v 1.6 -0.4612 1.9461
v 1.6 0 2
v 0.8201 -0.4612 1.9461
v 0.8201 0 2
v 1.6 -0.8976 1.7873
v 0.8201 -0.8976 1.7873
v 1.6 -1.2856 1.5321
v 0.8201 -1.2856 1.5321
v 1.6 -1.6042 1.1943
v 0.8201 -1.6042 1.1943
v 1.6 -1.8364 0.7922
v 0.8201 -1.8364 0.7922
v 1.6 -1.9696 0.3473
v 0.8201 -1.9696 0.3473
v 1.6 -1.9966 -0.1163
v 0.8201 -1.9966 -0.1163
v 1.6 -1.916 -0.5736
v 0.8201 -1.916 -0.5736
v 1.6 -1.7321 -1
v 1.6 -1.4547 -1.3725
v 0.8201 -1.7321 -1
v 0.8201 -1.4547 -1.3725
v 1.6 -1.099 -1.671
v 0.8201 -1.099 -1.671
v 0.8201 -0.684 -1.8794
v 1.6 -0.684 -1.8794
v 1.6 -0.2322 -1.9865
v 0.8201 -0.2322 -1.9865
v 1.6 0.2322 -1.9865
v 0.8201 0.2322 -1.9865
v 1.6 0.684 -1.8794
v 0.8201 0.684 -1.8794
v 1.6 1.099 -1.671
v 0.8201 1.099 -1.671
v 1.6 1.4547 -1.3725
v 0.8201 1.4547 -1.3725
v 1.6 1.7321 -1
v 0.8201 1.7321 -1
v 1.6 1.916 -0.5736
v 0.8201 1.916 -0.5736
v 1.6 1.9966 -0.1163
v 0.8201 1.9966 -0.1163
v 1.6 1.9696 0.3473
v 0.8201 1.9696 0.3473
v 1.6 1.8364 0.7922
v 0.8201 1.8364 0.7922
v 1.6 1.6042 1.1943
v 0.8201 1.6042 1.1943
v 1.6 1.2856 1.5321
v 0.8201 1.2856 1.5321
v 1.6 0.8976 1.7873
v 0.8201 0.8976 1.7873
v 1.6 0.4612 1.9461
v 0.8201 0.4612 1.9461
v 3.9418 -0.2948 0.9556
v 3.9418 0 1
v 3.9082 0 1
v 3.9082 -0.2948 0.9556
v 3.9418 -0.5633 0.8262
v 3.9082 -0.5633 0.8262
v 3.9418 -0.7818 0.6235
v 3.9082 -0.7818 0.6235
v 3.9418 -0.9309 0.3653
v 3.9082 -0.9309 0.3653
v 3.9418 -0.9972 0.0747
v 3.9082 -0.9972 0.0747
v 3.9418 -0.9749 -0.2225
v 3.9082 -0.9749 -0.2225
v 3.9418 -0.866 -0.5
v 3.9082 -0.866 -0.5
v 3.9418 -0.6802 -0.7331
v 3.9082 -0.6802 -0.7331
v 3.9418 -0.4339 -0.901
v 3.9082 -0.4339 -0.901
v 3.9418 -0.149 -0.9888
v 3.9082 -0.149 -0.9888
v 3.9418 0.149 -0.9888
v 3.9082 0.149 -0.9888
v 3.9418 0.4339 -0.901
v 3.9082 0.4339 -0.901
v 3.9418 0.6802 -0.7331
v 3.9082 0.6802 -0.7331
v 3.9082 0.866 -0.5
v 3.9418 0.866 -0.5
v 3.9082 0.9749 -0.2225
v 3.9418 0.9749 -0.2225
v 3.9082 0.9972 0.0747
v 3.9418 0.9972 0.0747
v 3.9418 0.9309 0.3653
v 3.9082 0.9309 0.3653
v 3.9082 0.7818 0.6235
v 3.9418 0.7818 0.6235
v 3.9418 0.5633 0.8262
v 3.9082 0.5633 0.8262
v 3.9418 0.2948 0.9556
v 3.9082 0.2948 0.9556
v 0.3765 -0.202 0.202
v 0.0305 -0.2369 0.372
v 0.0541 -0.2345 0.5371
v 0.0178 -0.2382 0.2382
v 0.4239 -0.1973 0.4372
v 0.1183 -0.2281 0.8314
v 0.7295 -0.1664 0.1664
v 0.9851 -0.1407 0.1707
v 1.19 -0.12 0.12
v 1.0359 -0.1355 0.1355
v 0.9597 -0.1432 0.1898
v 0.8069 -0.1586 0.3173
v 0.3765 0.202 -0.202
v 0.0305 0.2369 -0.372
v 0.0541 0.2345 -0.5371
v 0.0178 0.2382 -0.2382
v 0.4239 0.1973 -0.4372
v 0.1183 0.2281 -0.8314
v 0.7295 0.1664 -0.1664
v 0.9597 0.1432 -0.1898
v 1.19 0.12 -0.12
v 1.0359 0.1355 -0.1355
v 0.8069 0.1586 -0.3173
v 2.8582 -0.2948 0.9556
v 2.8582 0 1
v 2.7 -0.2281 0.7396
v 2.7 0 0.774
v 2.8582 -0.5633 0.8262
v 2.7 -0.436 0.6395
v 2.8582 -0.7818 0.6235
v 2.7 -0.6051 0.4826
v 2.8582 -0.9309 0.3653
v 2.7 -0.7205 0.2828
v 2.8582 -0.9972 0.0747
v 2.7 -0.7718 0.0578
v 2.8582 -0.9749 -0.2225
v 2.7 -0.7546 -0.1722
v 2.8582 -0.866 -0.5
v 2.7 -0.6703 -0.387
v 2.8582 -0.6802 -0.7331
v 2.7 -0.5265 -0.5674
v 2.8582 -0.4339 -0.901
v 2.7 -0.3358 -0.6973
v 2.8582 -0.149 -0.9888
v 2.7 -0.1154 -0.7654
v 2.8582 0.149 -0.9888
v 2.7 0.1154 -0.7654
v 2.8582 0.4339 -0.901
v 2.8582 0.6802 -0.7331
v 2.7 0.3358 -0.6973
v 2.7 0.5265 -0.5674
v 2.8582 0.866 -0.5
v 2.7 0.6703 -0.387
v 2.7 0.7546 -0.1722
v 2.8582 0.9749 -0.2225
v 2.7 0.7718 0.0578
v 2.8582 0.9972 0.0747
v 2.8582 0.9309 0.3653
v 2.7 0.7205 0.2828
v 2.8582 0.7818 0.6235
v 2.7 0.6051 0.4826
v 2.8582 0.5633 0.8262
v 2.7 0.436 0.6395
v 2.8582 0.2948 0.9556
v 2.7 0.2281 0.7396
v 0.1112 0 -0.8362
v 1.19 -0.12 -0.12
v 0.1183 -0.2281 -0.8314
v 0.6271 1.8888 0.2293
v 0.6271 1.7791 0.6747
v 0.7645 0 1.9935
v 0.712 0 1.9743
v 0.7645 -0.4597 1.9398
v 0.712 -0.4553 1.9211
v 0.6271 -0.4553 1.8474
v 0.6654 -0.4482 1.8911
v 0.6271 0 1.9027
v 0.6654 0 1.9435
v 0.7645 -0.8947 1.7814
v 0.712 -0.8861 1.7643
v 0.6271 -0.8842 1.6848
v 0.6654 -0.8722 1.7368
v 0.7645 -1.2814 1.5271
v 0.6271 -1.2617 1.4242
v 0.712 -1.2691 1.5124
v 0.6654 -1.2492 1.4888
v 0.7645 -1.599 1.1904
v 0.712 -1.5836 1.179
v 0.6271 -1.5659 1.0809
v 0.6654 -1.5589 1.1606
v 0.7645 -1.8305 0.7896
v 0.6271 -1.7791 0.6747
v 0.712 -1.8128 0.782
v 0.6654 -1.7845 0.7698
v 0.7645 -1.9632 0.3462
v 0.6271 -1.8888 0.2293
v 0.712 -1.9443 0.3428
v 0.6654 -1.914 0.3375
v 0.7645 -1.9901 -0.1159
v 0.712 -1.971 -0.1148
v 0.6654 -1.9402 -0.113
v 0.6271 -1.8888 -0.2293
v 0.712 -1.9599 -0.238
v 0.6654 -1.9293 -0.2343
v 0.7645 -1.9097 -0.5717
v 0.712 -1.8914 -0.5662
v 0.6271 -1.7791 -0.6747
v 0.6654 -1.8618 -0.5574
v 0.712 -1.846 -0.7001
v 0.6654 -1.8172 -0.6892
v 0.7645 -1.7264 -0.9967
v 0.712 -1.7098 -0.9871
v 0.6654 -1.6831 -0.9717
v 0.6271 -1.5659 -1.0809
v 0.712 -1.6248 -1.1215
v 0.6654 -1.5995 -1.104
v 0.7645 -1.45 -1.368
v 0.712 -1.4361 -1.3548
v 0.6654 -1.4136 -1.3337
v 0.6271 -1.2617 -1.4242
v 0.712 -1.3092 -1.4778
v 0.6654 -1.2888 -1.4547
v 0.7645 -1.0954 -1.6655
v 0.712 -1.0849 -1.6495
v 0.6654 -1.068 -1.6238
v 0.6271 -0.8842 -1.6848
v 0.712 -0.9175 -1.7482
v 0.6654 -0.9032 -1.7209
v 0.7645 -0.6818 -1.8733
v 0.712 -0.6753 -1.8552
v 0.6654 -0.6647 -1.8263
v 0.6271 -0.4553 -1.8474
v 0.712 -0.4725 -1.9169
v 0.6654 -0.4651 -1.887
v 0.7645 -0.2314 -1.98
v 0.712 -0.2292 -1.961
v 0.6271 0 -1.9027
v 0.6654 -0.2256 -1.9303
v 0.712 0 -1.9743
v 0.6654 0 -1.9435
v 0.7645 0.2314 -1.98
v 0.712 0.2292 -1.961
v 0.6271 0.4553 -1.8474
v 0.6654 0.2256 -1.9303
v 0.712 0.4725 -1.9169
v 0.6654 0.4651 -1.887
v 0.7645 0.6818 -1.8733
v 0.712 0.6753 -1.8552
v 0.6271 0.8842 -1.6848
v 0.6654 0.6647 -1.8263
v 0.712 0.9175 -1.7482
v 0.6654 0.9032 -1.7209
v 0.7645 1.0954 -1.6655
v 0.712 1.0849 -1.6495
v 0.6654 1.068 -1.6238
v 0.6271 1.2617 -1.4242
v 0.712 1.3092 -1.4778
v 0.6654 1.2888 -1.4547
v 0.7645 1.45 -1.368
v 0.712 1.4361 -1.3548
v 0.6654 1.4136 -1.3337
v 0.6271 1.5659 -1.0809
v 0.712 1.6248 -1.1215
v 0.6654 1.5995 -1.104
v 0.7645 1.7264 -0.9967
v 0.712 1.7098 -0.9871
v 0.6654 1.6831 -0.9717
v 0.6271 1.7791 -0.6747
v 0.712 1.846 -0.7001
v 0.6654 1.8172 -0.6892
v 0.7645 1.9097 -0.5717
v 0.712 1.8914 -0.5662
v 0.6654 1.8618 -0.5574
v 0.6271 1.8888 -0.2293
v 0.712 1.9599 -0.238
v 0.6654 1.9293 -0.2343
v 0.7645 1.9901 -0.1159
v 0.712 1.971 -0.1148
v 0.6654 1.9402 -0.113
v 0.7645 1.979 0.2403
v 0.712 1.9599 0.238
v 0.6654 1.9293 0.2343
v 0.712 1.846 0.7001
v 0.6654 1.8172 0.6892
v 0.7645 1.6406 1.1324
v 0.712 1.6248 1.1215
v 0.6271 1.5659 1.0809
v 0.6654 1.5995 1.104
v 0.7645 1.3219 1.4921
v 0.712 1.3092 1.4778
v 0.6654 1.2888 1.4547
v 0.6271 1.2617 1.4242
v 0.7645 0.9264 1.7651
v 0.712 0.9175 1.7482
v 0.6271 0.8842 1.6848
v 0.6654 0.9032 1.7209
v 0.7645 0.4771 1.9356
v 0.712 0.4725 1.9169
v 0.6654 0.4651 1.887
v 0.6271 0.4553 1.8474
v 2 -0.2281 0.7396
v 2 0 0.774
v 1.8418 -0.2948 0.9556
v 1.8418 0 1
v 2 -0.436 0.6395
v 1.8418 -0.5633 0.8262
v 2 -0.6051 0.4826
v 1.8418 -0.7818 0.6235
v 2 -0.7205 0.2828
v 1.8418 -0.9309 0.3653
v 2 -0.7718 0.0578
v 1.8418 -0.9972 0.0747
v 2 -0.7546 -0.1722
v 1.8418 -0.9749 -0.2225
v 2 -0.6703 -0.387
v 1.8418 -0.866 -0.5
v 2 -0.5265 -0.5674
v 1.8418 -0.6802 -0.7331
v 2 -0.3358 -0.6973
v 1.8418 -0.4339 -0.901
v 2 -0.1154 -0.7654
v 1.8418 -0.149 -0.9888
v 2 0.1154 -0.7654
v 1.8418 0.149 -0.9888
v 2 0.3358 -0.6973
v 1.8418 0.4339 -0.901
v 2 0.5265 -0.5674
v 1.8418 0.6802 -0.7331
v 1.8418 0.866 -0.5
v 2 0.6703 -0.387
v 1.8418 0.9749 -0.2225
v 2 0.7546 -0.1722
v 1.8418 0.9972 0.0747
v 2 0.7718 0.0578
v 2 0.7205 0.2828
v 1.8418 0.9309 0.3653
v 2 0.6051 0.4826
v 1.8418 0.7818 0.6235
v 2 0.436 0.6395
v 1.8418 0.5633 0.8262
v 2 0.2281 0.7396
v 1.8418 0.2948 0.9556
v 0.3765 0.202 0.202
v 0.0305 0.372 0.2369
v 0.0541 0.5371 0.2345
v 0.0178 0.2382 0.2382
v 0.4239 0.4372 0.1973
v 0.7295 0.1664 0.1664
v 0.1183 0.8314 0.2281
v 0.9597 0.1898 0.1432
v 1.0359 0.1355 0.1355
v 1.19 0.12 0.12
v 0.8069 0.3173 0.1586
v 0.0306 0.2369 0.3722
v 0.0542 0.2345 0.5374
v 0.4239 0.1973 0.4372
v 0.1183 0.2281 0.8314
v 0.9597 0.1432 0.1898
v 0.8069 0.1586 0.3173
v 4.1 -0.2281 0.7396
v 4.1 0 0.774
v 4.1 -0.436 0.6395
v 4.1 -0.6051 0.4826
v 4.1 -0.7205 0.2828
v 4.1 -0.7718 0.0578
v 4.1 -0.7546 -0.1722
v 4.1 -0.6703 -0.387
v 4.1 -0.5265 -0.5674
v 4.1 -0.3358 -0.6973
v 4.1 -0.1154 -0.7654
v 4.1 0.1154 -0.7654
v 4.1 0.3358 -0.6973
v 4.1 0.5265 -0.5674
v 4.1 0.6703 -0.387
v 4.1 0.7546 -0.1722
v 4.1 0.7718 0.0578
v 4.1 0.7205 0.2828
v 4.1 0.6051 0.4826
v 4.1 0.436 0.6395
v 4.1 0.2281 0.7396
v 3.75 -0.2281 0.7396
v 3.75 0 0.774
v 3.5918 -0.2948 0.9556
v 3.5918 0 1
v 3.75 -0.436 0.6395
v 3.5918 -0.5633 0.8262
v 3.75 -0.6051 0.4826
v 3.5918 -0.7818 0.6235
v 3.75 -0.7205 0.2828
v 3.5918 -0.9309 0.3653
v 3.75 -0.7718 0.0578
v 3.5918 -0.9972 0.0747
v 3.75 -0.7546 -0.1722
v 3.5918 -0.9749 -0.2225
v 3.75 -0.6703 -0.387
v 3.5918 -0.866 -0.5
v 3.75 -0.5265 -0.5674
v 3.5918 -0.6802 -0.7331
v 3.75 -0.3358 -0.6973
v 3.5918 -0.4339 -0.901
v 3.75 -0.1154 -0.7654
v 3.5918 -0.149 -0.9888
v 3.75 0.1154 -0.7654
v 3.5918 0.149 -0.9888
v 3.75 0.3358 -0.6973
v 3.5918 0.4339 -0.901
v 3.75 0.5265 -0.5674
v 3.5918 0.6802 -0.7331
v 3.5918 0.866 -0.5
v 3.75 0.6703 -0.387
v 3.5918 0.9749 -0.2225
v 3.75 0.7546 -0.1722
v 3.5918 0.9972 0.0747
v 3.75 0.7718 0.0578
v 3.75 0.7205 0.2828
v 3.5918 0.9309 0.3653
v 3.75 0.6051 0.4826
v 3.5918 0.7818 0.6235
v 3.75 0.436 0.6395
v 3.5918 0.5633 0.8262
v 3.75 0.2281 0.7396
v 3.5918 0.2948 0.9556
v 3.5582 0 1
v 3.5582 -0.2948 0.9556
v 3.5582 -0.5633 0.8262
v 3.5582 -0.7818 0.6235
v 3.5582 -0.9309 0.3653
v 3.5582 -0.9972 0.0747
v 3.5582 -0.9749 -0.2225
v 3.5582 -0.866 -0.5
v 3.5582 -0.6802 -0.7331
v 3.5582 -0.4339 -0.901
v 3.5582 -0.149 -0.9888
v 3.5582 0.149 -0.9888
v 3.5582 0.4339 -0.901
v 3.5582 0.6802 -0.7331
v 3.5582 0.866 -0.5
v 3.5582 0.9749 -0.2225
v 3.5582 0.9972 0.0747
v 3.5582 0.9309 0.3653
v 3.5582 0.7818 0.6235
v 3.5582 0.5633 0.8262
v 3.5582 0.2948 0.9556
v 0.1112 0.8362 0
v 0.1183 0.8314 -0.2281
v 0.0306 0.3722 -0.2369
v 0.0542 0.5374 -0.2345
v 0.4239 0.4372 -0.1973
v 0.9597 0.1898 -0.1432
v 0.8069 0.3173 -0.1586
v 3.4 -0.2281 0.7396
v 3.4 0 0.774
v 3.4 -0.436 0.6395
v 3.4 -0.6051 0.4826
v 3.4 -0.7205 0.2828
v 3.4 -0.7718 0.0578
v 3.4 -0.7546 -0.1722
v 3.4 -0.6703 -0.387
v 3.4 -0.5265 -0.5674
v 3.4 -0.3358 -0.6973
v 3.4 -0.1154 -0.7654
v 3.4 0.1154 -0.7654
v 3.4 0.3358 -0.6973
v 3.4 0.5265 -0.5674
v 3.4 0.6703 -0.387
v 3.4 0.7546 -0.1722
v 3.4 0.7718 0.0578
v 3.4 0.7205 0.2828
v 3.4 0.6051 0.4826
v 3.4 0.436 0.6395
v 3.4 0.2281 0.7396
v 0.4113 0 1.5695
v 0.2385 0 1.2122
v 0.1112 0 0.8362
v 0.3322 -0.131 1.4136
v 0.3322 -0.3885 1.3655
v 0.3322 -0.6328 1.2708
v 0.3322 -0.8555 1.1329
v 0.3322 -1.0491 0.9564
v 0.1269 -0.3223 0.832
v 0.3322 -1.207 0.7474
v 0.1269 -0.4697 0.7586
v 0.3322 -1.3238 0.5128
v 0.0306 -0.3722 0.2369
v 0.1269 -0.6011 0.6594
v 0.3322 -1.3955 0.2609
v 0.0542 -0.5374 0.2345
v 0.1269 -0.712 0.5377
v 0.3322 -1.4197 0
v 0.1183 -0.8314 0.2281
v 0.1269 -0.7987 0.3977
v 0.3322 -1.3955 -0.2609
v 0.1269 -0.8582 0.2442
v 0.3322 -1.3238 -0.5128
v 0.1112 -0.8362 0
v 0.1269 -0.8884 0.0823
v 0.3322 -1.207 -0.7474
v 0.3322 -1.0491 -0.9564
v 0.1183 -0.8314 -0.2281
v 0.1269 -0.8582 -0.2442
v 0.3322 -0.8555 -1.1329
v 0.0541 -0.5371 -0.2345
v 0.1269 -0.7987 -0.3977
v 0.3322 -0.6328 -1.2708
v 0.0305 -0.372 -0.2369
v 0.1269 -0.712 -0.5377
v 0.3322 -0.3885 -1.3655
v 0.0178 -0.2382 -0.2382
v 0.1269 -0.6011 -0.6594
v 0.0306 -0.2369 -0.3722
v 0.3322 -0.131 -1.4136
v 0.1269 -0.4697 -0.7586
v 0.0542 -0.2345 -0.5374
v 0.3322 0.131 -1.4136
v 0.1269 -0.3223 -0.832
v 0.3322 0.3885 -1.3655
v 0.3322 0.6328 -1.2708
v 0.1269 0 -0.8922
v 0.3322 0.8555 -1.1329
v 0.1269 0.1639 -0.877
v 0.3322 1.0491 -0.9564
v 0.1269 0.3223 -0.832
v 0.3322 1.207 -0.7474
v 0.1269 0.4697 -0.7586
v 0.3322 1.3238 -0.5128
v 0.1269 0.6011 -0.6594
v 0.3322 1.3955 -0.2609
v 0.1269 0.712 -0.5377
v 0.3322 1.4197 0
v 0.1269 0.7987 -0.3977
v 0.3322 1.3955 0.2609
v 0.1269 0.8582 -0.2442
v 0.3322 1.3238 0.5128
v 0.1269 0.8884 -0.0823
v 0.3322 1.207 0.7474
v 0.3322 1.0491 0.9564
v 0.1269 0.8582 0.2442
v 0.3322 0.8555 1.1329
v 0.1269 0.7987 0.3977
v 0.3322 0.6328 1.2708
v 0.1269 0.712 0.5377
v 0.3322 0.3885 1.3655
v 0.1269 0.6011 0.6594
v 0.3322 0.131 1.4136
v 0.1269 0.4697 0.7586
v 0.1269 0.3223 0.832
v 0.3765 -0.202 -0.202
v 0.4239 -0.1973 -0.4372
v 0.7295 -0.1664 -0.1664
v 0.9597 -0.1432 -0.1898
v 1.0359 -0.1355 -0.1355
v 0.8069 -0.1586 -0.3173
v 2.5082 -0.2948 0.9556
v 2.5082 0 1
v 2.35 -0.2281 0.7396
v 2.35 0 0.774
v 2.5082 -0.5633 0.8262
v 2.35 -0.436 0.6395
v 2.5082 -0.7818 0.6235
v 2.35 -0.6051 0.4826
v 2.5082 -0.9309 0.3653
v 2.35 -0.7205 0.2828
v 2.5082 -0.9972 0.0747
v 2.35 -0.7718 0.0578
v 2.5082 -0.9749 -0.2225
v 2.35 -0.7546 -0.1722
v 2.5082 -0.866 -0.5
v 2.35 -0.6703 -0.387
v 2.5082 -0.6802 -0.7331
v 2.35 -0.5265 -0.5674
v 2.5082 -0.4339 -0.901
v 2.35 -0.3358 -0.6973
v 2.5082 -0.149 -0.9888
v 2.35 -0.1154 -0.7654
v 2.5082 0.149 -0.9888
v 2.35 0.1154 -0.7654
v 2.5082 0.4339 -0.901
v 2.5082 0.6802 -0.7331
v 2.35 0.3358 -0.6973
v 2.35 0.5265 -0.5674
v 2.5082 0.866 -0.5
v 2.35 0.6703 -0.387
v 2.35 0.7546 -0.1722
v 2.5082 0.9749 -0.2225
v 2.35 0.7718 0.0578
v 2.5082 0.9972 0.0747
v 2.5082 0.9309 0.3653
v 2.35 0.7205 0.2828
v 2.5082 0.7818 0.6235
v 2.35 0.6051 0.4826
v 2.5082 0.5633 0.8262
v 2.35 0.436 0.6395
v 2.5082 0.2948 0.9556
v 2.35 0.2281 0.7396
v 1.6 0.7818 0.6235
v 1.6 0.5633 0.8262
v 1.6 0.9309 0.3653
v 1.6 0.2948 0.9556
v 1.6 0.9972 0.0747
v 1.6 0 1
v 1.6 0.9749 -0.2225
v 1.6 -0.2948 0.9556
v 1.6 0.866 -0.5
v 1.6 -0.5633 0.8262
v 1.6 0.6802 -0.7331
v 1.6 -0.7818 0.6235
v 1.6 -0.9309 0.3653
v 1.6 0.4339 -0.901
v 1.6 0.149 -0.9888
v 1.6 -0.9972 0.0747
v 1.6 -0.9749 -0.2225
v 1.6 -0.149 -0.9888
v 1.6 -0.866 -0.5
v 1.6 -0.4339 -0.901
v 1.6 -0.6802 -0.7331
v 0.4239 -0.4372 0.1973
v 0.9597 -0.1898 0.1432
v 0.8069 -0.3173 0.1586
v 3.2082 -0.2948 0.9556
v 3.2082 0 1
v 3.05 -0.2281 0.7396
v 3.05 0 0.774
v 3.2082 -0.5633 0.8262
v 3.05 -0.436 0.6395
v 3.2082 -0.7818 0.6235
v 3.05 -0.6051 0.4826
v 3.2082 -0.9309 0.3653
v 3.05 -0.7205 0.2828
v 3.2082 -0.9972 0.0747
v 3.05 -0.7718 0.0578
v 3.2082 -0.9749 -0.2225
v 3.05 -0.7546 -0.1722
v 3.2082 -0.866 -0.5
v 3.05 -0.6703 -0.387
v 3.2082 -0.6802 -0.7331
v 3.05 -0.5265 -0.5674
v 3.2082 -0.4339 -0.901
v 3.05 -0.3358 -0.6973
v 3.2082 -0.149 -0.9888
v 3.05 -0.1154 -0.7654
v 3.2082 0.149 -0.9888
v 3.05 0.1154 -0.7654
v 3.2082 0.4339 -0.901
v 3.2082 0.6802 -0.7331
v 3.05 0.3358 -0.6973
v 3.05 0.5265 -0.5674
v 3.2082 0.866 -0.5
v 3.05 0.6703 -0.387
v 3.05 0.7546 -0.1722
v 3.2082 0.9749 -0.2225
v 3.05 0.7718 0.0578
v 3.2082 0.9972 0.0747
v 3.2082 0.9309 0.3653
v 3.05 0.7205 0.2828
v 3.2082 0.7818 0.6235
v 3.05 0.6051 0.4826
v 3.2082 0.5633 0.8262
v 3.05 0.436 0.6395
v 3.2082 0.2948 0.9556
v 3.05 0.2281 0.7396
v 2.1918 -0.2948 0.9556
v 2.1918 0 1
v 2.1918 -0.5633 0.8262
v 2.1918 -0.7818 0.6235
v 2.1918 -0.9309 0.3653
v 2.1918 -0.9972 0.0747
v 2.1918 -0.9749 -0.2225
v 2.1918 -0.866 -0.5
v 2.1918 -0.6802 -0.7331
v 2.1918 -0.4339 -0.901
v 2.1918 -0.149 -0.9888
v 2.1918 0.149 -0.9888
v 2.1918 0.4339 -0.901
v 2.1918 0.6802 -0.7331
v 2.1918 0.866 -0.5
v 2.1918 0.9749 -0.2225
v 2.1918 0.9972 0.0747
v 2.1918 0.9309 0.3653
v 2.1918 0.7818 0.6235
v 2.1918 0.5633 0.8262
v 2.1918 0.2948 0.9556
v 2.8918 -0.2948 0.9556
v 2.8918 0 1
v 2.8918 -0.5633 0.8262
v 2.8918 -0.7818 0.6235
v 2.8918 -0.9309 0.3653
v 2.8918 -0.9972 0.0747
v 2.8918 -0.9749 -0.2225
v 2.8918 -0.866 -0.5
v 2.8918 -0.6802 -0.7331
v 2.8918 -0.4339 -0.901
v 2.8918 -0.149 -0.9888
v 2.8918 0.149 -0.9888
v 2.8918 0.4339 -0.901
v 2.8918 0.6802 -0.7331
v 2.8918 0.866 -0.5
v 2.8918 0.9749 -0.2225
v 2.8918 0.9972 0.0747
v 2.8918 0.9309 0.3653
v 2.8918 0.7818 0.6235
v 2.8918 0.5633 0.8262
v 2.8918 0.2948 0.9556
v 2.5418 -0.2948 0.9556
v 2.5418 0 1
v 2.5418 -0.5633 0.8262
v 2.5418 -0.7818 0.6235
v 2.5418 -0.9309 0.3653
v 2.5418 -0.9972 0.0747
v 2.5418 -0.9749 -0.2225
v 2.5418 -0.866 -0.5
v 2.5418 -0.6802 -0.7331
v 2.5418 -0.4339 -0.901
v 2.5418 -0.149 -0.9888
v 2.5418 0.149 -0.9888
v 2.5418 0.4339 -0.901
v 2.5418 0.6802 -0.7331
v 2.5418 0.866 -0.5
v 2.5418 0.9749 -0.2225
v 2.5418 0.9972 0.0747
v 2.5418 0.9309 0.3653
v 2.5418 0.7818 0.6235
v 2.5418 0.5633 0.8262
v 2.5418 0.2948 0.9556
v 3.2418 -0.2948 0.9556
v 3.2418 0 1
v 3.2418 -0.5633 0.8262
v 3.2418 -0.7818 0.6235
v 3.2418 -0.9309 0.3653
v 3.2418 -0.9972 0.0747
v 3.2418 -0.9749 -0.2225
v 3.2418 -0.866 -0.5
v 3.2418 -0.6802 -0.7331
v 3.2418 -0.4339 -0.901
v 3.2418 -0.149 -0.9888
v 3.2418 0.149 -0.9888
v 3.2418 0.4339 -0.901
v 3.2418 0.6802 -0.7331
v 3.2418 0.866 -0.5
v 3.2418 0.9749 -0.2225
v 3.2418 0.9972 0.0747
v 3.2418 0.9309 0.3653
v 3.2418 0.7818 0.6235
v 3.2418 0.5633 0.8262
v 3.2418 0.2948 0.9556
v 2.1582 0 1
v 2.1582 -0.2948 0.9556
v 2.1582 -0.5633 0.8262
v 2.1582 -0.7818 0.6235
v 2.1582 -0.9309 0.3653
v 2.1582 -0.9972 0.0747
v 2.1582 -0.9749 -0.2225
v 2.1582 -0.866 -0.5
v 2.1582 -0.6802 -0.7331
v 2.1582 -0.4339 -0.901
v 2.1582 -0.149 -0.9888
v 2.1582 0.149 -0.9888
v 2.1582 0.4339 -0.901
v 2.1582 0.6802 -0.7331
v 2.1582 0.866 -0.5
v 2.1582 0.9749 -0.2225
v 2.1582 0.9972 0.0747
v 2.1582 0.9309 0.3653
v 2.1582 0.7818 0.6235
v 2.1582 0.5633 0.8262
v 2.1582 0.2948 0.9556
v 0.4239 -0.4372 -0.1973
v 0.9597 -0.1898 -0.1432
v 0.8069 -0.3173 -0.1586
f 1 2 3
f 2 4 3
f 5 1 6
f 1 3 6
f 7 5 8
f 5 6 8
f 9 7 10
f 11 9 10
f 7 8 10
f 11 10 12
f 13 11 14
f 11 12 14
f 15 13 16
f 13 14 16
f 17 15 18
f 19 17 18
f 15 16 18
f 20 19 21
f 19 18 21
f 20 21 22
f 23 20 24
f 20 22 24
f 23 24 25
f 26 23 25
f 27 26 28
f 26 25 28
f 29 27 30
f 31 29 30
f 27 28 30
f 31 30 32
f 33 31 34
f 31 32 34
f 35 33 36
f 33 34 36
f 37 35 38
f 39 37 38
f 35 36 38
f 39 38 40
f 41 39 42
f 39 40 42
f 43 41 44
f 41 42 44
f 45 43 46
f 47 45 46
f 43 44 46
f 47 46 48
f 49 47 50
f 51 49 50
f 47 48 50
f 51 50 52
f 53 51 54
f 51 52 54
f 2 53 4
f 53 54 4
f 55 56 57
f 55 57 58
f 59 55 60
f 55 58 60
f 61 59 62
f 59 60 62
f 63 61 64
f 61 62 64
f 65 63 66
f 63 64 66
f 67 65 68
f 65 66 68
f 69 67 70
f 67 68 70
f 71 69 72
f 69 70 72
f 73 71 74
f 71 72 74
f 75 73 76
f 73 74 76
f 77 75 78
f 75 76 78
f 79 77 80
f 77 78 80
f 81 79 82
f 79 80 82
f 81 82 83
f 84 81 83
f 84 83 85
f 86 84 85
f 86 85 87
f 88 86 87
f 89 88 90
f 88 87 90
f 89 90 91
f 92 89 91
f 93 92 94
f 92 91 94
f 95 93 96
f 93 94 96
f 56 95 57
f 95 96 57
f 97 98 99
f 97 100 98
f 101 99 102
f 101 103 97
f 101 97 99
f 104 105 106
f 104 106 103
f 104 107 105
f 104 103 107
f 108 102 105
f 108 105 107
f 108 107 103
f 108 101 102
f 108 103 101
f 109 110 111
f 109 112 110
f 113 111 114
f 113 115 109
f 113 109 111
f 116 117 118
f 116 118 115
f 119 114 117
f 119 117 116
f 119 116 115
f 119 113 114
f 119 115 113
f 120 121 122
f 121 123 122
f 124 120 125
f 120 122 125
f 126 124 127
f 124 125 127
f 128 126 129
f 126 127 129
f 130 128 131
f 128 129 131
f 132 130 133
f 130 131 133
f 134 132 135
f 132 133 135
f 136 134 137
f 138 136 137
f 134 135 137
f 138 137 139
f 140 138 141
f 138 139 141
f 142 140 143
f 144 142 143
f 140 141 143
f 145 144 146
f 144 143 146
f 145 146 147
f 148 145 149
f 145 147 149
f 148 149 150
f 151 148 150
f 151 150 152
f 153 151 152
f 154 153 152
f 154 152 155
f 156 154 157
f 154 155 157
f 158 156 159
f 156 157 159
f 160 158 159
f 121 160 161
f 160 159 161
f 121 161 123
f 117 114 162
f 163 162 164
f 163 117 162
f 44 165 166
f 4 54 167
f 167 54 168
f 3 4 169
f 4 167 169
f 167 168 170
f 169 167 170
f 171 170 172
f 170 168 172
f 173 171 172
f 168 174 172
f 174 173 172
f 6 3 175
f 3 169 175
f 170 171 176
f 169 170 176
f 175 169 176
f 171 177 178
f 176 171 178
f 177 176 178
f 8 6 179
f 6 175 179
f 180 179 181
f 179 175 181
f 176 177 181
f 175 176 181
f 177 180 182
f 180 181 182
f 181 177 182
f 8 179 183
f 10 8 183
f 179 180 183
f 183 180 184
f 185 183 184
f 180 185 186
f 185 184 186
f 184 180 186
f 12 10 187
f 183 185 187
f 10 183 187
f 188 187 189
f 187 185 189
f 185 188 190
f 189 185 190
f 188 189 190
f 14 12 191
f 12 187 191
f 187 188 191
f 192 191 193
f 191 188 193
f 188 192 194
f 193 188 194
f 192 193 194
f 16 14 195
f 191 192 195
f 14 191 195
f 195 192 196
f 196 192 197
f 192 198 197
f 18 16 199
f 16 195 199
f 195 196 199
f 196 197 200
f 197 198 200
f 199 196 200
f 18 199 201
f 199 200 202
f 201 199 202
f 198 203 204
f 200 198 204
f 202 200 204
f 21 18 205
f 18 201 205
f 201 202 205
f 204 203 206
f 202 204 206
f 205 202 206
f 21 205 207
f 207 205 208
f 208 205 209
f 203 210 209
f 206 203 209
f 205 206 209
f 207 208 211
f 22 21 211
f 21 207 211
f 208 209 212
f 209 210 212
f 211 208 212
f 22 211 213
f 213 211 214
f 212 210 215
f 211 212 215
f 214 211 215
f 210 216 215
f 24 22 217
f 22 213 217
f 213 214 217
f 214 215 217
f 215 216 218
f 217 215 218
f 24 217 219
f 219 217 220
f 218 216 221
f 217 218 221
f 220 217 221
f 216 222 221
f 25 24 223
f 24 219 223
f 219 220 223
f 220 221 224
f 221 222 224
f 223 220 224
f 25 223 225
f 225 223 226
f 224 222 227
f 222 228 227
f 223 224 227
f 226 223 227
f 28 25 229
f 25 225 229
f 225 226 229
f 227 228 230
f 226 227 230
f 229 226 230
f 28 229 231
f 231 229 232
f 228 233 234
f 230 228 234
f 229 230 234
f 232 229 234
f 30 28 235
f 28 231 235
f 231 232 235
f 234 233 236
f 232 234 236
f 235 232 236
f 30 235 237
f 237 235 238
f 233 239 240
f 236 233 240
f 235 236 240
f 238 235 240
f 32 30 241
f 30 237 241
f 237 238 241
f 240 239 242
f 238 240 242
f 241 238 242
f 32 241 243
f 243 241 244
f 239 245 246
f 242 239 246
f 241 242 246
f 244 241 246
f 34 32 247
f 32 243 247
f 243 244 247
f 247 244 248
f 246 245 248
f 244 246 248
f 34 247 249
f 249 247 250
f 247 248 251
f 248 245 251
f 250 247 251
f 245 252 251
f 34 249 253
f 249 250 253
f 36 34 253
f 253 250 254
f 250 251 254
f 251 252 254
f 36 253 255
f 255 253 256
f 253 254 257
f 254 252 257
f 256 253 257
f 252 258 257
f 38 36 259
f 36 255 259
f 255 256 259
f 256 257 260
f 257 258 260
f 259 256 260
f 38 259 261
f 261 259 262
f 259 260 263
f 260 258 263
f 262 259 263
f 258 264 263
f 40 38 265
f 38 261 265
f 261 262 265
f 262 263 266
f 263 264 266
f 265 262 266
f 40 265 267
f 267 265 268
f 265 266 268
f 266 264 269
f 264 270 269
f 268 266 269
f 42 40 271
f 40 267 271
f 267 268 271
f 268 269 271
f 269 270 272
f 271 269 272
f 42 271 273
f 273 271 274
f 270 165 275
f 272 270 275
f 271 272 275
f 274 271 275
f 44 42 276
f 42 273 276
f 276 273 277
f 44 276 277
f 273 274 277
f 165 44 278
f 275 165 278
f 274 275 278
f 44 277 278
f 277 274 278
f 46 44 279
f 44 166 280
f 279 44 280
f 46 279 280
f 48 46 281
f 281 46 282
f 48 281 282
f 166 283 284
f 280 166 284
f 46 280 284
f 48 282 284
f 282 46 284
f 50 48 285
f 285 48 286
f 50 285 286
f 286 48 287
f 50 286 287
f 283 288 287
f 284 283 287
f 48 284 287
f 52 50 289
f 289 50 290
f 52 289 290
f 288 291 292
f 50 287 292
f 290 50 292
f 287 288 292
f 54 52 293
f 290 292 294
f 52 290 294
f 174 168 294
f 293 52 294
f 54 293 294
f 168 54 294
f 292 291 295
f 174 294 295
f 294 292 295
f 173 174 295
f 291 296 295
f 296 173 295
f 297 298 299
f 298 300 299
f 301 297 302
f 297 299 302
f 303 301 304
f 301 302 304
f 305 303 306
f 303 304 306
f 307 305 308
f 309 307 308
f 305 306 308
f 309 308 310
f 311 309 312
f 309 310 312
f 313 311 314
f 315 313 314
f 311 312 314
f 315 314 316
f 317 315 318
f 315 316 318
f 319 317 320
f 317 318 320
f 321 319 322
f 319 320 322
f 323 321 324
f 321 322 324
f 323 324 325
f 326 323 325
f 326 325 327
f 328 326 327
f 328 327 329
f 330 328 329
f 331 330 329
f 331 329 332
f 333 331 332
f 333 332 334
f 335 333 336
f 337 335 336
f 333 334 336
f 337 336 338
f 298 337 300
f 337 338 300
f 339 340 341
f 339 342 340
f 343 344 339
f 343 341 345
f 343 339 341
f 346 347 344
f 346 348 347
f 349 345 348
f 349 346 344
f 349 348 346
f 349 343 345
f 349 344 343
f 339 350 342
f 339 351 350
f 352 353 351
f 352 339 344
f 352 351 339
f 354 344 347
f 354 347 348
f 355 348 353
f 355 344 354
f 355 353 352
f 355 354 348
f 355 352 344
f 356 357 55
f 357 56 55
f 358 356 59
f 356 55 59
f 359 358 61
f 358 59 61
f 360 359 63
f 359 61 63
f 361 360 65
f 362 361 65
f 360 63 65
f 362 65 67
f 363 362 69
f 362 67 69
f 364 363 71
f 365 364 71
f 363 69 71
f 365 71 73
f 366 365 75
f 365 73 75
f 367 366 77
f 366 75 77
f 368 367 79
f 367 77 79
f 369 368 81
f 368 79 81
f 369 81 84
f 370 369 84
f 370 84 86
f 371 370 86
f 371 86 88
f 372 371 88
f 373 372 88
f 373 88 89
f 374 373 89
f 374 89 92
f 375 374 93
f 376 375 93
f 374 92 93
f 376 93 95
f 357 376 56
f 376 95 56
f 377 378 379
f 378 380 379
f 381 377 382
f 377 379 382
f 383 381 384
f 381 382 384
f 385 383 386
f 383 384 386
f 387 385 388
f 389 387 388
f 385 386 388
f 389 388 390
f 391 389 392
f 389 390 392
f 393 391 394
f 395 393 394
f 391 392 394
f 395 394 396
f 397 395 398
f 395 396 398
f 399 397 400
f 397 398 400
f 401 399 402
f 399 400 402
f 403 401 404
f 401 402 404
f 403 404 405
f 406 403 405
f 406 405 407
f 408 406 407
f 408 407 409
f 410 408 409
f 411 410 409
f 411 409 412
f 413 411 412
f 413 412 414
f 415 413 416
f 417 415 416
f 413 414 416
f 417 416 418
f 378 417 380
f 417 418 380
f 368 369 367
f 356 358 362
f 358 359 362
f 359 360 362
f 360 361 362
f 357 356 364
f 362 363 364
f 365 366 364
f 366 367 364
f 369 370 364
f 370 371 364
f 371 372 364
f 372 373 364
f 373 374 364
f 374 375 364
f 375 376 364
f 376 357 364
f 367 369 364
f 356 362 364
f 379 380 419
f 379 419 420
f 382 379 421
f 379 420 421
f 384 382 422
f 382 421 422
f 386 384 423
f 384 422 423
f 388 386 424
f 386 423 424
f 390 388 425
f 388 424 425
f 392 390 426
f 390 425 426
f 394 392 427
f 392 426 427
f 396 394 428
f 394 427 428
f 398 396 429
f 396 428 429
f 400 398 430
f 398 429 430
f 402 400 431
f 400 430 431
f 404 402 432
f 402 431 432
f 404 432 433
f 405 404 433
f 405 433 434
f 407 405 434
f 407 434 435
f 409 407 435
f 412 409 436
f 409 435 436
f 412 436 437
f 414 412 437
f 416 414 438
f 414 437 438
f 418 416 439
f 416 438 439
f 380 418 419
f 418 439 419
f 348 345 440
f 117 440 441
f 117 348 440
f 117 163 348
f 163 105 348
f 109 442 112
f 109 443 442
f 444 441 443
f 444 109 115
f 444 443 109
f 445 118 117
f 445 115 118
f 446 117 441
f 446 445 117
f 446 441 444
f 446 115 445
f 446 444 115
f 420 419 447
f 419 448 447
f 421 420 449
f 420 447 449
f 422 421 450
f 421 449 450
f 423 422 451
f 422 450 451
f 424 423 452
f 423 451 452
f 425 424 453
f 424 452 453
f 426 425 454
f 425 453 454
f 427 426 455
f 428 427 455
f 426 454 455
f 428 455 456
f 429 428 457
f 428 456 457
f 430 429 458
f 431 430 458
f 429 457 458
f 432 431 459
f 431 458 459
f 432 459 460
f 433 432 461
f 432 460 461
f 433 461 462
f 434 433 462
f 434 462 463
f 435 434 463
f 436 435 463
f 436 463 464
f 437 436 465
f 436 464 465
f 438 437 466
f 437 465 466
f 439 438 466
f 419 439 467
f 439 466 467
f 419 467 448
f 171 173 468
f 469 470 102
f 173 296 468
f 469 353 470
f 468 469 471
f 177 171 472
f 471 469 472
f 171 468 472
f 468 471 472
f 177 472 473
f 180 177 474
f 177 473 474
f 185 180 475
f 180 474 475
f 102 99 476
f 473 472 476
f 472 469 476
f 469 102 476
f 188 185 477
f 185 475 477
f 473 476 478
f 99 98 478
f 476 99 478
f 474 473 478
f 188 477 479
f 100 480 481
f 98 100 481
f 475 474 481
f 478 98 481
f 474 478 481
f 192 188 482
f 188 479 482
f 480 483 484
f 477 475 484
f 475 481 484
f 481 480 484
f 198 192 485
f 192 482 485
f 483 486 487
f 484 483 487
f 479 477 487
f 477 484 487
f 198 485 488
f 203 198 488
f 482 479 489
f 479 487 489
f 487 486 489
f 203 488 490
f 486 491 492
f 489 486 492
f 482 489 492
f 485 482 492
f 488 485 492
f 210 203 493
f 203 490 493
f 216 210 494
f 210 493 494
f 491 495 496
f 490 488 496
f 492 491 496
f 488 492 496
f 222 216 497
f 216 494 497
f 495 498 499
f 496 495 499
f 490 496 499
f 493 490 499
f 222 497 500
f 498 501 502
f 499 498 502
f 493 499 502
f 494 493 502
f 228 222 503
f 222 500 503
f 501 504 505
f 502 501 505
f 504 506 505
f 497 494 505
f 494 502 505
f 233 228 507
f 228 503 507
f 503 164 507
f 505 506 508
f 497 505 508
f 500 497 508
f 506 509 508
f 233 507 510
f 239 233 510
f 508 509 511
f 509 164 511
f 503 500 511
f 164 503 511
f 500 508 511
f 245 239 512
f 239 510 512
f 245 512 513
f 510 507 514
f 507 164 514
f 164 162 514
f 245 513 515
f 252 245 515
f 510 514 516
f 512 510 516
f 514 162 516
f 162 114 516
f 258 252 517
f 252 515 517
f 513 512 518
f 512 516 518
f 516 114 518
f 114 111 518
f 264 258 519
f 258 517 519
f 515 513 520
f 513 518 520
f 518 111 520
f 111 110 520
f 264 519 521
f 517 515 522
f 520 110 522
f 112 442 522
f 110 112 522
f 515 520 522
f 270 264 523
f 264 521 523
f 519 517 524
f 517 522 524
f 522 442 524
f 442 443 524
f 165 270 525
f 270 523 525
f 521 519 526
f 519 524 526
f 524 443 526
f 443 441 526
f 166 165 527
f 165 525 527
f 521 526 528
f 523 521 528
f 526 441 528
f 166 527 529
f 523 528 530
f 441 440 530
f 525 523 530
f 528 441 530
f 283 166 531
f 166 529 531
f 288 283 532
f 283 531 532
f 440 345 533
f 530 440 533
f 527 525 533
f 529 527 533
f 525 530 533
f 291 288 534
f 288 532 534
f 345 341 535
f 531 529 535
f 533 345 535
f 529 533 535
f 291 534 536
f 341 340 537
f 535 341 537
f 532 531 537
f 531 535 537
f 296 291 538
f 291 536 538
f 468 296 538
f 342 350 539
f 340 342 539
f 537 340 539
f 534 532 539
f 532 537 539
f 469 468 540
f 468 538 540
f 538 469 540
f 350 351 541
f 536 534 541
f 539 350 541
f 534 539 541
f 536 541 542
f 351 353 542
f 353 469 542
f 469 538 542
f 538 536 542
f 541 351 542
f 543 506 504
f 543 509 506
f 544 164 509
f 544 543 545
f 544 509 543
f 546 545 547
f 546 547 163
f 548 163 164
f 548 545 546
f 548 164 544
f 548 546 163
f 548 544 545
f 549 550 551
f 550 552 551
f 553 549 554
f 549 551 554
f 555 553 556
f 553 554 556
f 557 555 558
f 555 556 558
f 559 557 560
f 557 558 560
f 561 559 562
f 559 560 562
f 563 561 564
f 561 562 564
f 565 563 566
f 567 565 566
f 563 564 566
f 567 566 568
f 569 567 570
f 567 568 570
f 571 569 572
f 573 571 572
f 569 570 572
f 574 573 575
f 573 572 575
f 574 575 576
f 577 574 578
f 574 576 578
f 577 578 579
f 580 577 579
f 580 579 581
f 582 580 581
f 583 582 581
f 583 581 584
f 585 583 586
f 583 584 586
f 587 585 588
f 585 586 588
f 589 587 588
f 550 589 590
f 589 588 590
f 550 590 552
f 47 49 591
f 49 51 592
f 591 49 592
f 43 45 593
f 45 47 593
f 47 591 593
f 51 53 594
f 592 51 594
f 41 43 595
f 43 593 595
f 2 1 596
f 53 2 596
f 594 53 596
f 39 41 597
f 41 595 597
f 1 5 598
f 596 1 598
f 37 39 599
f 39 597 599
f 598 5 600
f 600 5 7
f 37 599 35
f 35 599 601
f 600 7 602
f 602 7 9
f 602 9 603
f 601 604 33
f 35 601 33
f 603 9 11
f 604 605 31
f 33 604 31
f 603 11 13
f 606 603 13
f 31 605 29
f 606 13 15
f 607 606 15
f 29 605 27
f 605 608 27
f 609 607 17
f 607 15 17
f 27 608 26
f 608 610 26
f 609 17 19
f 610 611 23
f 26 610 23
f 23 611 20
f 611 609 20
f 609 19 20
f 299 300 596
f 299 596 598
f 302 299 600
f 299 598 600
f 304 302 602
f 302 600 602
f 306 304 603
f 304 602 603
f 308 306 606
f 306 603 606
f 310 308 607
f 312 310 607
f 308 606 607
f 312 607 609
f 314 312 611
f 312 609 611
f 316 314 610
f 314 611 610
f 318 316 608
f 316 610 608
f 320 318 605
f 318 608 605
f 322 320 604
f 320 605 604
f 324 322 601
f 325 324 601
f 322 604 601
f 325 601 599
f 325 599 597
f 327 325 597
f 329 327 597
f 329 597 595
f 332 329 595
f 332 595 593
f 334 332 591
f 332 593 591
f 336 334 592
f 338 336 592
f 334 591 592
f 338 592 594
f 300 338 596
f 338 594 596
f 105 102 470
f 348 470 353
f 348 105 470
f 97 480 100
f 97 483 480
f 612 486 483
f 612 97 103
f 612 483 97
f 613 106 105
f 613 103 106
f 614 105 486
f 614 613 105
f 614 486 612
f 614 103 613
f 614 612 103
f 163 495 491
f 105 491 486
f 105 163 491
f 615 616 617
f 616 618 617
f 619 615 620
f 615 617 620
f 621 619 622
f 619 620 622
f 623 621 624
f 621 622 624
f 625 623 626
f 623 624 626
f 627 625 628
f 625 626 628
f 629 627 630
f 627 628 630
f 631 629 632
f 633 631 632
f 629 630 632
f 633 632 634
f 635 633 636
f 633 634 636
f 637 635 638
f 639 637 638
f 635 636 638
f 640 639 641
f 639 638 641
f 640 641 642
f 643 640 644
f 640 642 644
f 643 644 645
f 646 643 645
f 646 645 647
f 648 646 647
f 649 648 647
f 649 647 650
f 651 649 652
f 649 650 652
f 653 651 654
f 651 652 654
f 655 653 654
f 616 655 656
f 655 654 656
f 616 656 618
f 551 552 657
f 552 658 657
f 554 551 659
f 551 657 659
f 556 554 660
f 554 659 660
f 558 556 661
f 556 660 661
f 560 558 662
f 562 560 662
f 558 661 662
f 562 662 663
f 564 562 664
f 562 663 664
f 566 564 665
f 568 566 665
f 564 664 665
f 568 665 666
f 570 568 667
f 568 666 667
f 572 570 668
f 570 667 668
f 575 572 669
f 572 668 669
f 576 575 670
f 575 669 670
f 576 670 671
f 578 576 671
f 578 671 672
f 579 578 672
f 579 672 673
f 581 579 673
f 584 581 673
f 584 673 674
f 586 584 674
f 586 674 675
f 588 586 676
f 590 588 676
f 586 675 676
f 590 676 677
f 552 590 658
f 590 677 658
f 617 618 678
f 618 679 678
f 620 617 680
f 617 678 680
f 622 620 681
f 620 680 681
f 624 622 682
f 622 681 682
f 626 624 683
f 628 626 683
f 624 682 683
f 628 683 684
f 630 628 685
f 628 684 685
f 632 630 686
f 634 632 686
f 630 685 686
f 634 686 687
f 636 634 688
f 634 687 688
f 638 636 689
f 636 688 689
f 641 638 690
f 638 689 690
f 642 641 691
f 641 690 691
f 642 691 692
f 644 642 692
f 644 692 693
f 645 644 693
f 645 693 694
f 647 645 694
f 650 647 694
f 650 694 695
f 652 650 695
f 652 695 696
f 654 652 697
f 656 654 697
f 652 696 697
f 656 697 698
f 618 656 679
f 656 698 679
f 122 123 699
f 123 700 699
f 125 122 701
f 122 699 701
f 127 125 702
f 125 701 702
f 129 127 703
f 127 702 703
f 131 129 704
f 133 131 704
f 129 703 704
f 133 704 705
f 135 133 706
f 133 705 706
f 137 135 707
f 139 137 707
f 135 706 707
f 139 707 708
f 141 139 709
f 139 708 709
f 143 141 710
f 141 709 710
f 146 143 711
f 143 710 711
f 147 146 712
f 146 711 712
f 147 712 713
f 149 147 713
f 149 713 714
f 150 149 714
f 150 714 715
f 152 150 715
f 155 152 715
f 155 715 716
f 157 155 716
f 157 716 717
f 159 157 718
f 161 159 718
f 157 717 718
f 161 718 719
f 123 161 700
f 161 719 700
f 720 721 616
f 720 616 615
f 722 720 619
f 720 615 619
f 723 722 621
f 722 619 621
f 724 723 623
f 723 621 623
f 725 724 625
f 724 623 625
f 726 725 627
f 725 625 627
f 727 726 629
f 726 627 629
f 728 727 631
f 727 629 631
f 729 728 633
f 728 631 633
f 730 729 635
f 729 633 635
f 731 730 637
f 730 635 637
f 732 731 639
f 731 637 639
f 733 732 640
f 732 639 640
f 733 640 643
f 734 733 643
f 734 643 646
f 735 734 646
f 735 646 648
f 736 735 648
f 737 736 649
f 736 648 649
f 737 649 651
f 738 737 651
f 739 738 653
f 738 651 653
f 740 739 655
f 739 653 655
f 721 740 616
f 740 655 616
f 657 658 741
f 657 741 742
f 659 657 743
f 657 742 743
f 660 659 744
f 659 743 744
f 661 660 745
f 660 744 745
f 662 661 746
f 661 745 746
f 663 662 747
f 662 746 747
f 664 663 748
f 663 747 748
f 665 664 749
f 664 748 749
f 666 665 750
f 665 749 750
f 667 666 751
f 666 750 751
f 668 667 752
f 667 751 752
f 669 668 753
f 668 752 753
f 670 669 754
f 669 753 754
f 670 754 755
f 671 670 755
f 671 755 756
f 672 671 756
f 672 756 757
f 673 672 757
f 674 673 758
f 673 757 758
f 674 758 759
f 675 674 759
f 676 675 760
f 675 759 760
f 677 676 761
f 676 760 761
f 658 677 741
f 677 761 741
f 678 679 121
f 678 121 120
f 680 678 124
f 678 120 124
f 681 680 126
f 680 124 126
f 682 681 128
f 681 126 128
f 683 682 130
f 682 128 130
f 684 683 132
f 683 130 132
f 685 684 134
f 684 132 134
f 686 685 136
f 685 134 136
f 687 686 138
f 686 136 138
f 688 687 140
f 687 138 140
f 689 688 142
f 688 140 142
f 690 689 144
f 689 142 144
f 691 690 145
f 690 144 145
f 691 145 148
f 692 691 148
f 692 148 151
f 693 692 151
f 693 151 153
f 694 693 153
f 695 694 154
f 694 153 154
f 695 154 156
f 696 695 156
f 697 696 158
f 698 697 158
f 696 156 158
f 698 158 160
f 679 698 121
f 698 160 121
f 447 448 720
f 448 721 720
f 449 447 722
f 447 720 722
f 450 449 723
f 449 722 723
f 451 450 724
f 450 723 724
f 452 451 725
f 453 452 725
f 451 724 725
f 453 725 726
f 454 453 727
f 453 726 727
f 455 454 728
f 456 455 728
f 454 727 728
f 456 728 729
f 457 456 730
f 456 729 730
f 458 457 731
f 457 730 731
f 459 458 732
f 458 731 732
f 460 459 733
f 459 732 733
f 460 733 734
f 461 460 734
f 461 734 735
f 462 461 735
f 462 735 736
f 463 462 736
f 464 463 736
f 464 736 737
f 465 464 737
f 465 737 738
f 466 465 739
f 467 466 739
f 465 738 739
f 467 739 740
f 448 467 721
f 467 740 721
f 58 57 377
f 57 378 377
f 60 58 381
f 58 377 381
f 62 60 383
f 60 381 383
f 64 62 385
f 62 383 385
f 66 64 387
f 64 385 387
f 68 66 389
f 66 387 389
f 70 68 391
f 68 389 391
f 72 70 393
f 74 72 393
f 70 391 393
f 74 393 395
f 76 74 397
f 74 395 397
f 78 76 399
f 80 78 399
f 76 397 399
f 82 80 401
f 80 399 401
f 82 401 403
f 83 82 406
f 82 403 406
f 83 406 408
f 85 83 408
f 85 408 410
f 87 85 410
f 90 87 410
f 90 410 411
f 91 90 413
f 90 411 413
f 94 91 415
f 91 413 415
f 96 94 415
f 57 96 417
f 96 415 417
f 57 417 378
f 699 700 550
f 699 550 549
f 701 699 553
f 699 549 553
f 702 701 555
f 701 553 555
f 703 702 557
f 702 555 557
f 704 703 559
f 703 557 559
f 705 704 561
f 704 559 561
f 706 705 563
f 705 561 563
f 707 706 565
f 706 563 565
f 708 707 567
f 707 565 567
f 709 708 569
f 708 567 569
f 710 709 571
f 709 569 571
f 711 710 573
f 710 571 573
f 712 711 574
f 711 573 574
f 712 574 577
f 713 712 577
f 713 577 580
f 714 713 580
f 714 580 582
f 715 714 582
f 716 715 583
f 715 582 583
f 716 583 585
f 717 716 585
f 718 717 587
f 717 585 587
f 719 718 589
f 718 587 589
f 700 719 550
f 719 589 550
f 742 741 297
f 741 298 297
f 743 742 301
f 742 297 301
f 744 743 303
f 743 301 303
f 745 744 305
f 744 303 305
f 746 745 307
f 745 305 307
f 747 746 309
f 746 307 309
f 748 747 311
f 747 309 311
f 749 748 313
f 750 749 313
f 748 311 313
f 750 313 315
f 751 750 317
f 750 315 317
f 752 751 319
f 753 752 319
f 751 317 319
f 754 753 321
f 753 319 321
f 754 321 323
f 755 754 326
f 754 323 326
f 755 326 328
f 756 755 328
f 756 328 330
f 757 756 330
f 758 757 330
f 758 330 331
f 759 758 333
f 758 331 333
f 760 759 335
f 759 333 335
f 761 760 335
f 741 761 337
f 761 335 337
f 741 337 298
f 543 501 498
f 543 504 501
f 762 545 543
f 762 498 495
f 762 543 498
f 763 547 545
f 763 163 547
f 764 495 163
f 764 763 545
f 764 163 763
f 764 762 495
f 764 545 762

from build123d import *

# Parameters (mm, degrees)
CIRPATTERN1_COUNT = 2
CIRPATTERN1_ANGLE = 90
THDSCHPAT_COUNT   = 7
THDSCHPAT_PITCH   = 0.35


with BuildPart() as part:
    # BodySke → Base-Revolve (revolve)
    with BuildSketch(Plane.XY, mode=Mode.PRIVATE) as base_revolve_sk:
        with BuildLine():
            Line((1.6, 1), (1.6, 2))
            Line((1.6, 2), (0.820084035, 2))
            ThreePointArc((0.820084035, 2), (0.712029995, 1.974299613), (0.627117876, 1.902702703))
            ThreePointArc((0.627117876, 1.902702703), (0.160820604, 1.001692868), (0, 0))
            Line((0, 0), (4.1, 0))
            Line((4.1, 0), (4.1, 1))
            Line((4.1, 1), (1.6, 1))
        make_face()
    revolve(base_revolve_sk.sketch.rotate(Axis((-25.4, 0, 0), (1, 0, 0)), 90), axis=Axis((-25.4, 0, 0), (1, 0, 0)))

    # Sketch3 → Cut-Loft1 section 0
    with BuildSketch(Plane(origin=(0, 0, 0), x_dir=(0, 0, -1), z_dir=(1, 0, 0))):
        with BuildLine():
            Line((0.24, -0.91), (-0.24, -0.91))
            Line((-0.24, -0.91), (-0.24, 0.91))
            Line((-0.24, 0.91), (0.24, 0.91))
            Line((0.24, 0.91), (0.24, -0.91))
        make_face()
    # Sketch4 → Cut-Loft1 section 1
    with BuildSketch(Plane(origin=(1.19, 0, 0), x_dir=(0, 0, -1), z_dir=(1, 0, 0))):
        with BuildLine():
            Line((0.12, -0.12), (-0.12, -0.12))
            Line((-0.12, -0.12), (-0.12, 0.12))
            Line((-0.12, 0.12), (0.12, 0.12))
            Line((0.12, 0.12), (0.12, -0.12))
        make_face()
    cut_loft1 = loft(mode=Mode.SUBTRACT)

    # CirPattern1: Cut-Loft1 ×2 about axis
    cirpattern1_axis = Axis((0, 0, 0), (1, 0, 0))
    for i in range(1, CIRPATTERN1_COUNT):
        add(cut_loft1.rotate(cirpattern1_axis, i * CIRPATTERN1_ANGLE / (CIRPATTERN1_COUNT - 1)), mode=Mode.SUBTRACT)

    # ThdSchSke → ThreadSchematic (revolve, cut)
    with BuildSketch(Plane.XY, mode=Mode.PRIVATE) as threadschematic_sk:
        Polygon((2, -0.774), (1.841753096, -1), (1.841753096, -1.25), (2.158246904, -1.25), (2.158246904, -1), align=None)
    threadschematic = revolve(threadschematic_sk.sketch.rotate(Axis((-3.175, 0, 0), (1, 0, 0)), 270), axis=Axis((-3.175, 0, 0), (1, 0, 0)), mode=Mode.SUBTRACT)

    # ThdSchPat: ThreadSchematic ×7
    with Locations(*[(i * THDSCHPAT_PITCH, 0, 0) for i in range(1, THDSCHPAT_COUNT)]):
        add(threadschematic, mode=Mode.SUBTRACT)


solid = part.part
